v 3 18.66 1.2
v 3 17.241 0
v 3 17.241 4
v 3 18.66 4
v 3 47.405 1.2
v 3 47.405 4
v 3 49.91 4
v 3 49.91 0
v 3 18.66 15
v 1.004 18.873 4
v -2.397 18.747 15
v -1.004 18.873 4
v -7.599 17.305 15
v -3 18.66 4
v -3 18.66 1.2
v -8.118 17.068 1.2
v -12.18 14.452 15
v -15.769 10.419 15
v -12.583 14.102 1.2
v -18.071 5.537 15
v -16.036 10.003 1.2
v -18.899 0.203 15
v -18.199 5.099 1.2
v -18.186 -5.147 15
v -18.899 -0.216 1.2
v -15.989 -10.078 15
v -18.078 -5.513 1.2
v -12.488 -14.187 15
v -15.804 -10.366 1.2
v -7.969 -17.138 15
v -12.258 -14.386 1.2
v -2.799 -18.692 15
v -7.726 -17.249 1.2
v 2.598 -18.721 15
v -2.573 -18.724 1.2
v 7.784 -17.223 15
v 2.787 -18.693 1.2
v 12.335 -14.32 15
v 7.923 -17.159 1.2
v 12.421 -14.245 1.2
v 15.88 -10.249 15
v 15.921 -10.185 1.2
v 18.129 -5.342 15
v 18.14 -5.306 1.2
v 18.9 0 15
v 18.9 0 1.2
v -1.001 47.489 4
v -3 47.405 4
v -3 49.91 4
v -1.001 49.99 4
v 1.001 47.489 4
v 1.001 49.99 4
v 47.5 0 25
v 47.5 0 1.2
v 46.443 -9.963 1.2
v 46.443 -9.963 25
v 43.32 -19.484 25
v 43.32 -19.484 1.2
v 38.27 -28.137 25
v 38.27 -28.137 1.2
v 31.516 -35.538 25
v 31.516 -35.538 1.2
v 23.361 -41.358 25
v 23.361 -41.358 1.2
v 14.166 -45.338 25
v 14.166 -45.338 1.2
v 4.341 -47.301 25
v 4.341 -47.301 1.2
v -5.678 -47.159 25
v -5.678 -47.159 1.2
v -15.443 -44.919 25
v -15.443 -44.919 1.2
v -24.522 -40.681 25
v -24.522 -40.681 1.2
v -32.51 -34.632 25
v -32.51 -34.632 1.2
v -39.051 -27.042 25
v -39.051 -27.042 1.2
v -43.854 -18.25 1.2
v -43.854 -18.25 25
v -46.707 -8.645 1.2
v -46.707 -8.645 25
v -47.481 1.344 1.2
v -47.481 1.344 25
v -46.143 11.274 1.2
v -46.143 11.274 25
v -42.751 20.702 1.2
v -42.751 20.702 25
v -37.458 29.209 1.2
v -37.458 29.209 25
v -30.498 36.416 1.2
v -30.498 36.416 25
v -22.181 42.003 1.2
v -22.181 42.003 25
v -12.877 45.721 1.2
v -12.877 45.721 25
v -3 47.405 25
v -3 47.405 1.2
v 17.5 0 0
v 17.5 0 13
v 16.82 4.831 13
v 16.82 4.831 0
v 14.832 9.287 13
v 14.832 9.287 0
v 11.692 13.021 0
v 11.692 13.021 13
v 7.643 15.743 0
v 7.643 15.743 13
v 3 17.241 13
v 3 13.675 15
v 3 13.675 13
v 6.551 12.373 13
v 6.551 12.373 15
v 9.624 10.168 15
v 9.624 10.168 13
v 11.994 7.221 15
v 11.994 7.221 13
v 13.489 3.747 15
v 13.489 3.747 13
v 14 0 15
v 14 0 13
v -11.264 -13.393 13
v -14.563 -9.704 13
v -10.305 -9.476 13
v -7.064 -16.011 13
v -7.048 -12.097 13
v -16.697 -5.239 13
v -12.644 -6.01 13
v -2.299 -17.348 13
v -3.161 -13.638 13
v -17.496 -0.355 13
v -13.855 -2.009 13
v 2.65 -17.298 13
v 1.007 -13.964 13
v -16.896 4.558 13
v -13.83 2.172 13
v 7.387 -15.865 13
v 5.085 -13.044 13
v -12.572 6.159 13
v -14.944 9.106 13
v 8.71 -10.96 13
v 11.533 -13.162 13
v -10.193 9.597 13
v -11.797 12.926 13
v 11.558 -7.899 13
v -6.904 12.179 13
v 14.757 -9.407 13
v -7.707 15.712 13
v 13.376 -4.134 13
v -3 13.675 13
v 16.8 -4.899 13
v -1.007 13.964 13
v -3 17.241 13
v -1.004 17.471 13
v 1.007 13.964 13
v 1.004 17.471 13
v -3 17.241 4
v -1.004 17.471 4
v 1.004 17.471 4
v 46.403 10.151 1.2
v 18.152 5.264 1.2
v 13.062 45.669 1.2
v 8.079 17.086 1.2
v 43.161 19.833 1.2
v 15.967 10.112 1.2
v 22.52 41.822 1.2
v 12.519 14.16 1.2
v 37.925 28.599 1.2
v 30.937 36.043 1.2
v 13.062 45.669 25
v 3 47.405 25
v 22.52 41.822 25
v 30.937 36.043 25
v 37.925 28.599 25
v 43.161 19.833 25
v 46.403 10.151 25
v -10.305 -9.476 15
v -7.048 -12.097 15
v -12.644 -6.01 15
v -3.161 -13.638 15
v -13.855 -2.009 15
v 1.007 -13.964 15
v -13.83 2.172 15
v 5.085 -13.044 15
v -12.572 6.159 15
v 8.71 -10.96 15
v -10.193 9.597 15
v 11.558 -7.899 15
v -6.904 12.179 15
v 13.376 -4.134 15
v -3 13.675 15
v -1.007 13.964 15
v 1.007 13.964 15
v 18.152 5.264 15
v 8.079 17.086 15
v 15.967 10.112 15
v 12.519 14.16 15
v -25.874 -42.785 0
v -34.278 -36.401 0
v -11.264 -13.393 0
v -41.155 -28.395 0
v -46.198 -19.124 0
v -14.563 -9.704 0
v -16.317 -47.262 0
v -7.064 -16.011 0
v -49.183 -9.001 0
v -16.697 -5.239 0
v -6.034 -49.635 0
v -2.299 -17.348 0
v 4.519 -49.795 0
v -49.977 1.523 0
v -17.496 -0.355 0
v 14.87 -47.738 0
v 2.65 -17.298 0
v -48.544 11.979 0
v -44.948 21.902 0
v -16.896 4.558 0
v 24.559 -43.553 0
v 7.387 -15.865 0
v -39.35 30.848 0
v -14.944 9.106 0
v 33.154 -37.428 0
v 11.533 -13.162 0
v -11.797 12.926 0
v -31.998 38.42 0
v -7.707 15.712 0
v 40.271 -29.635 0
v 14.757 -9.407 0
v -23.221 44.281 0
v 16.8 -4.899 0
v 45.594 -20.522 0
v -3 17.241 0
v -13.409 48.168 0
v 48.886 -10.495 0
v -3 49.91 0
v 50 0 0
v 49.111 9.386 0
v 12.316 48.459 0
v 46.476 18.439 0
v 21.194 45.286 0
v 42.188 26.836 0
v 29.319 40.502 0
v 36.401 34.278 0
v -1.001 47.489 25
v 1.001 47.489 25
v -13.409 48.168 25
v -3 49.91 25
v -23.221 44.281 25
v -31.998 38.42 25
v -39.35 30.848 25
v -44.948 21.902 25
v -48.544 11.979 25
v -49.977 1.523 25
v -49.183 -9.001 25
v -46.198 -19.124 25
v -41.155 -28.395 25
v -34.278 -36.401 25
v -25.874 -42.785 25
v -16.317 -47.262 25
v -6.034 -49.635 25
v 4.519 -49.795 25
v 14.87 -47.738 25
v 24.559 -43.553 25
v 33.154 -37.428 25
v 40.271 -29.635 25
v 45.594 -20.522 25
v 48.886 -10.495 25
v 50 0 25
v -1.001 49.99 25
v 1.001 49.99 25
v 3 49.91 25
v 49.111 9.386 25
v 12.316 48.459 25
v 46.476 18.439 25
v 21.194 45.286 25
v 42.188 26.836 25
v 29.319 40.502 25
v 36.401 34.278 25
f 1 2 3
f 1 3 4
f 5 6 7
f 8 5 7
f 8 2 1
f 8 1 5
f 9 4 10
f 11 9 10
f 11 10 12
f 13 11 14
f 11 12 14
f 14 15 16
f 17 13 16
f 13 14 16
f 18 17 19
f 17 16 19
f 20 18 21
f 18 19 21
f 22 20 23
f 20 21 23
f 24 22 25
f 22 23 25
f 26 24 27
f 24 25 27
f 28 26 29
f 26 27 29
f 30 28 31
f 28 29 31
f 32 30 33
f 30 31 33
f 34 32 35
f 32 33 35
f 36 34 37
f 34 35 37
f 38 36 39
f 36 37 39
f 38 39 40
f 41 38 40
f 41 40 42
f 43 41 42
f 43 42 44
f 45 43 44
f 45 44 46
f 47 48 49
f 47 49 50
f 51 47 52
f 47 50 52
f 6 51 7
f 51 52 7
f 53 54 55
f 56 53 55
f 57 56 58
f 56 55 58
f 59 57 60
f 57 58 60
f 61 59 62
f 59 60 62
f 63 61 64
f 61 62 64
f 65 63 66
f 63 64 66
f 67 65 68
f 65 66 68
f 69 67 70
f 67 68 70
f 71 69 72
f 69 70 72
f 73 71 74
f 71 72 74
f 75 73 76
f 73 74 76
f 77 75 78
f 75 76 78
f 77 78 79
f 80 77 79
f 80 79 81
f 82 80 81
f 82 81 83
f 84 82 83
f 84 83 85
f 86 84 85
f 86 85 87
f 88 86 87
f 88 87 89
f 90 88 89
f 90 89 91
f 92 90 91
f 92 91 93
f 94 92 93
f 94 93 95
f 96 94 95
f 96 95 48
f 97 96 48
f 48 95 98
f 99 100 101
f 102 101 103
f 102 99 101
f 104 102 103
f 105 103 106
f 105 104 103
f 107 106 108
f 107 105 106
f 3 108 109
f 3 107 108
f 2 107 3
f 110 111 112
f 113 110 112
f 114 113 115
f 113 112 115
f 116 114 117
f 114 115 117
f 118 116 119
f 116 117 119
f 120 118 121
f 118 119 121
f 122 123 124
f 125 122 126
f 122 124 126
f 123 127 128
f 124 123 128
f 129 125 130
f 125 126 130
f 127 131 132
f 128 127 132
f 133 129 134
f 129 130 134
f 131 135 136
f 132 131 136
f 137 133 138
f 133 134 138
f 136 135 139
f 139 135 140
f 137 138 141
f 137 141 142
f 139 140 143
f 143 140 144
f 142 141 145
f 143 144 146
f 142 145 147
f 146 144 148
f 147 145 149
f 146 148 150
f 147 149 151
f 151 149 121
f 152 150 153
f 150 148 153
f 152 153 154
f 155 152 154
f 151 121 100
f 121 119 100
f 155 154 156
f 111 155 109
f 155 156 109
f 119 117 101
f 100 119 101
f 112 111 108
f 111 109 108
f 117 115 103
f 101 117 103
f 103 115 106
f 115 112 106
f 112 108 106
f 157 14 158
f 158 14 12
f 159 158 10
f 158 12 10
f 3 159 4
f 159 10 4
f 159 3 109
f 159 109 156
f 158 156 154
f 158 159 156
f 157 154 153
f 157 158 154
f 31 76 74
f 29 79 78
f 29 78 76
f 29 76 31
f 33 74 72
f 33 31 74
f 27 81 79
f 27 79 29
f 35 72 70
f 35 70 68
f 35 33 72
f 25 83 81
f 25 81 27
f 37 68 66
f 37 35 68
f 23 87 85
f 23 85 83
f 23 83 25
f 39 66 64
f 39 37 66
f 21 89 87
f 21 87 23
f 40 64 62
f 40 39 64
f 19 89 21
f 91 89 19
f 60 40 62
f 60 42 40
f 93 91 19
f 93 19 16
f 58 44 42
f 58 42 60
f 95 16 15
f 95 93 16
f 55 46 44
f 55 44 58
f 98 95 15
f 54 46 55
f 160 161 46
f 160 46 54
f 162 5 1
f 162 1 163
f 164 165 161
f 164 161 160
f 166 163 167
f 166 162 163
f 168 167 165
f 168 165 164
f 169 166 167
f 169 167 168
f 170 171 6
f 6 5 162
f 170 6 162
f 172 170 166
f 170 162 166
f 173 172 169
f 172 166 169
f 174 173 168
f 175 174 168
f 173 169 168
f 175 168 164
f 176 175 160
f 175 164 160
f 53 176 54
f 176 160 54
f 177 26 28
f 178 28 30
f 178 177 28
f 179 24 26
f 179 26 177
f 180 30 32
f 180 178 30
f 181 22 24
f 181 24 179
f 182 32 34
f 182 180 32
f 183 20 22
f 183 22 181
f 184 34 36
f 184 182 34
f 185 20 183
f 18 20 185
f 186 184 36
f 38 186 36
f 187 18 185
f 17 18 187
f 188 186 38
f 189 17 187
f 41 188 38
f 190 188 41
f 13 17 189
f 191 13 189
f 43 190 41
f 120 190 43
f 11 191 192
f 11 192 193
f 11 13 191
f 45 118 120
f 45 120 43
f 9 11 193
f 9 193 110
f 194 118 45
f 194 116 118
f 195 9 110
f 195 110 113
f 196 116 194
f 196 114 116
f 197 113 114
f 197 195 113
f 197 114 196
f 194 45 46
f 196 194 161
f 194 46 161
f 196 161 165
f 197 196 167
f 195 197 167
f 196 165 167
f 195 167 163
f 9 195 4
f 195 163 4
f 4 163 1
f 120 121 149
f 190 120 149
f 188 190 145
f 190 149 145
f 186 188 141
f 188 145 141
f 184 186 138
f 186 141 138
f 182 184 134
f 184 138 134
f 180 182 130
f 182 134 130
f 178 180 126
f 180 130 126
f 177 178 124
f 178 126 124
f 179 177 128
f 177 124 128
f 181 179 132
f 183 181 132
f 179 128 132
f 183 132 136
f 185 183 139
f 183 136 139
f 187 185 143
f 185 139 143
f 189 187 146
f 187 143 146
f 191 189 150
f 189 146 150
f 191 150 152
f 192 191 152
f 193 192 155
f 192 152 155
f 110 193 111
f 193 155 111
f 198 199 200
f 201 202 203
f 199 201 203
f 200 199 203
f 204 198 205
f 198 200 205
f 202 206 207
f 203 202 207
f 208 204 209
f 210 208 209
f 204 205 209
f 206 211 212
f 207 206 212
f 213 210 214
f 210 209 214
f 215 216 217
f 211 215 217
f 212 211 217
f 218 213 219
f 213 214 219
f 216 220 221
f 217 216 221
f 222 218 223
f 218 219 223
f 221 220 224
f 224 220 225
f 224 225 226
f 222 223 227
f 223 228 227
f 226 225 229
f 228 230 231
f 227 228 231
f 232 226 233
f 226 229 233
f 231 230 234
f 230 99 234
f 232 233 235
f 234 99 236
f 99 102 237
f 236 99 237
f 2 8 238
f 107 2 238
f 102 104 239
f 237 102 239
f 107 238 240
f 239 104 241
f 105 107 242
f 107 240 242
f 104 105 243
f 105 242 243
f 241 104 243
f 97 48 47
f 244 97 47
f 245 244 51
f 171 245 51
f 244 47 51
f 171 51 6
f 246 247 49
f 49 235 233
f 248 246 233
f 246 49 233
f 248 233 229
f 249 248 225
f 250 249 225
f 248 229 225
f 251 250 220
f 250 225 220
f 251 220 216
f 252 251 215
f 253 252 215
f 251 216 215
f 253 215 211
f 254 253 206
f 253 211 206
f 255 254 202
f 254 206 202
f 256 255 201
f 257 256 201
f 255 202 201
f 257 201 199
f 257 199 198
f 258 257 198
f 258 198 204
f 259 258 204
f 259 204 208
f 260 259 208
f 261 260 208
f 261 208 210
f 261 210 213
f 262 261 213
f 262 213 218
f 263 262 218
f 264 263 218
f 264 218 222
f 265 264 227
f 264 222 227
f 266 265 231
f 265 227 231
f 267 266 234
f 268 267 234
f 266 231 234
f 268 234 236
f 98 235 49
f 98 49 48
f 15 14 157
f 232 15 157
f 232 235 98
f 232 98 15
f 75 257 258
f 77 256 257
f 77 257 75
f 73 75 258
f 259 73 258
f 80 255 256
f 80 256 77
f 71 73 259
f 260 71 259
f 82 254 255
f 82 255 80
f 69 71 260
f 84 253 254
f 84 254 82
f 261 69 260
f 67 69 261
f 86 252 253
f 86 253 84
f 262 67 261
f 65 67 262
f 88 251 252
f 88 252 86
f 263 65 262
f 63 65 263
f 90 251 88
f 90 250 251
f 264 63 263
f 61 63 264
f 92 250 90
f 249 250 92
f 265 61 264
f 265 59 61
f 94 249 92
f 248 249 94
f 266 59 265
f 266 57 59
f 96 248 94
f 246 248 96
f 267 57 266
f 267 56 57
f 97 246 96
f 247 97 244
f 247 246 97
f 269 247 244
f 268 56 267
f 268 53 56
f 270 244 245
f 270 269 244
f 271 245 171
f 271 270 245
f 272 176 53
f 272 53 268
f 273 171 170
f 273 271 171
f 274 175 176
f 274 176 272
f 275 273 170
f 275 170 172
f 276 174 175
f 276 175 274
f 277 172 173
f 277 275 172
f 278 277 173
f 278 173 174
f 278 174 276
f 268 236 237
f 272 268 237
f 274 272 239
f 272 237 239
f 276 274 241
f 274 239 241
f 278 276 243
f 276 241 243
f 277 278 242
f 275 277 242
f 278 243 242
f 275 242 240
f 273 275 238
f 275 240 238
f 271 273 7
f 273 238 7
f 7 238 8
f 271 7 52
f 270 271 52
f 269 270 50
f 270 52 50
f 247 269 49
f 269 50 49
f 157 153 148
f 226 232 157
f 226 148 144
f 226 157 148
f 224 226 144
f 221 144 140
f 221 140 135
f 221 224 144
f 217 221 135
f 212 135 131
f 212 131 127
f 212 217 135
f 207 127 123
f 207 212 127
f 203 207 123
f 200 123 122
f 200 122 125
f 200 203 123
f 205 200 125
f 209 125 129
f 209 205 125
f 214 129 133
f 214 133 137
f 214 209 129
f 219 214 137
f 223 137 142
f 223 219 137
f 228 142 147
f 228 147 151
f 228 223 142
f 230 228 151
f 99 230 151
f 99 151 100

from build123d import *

# Parameters (mm, degrees)
F1_DEPTH = 15
F2_DEPTH = 13
F3_DEPTH = 1.2
F4_DEPTH = 25
F5_DEPTH = 4


with BuildPart() as f1:
    # F0 (on Top) → F1 (new body)
    with BuildSketch(Plane.XY):
        with BuildLine():
            ThreePointArc((-3, 17.2409396496), (0, 17.5), (3, 17.2409396496))
            Line((3, 17.2409396496), (3, 18.6603858481))
            ThreePointArc((3, 18.6603858481), (0, 18.9), (-3, 18.6603858481))
            Line((-3, 18.6603858481), (-3, 17.2409396496))
        make_face()
        with BuildLine():
            Line((3, 18.6603858481), (3, 17.2409396496))
            ThreePointArc((3, 17.2409396496), (13.393095236, 11.2638803261), (17.5, 0))
            ThreePointArc((17.5, 0), (-11.2638803261, -13.393095236), (-3, 17.2409396496))
            Line((-3, 17.2409396496), (-3, 18.6603858481))
            ThreePointArc((-3, 18.6603858481), (-12.2578546247, -14.3859306268), (18.9, 0))
            ThreePointArc((18.9, 0), (14.3859306268, 12.2578546247), (3, 18.6603858481))
        make_face()
        with BuildLine():
            ThreePointArc((-3, 13.6747943312), (0, 14), (3, 13.6747943312))
            Line((3, 13.6747943312), (3, 17.2409396496))
            ThreePointArc((3, 17.2409396496), (0, 17.5), (-3, 17.2409396496))
            Line((-3, 17.2409396496), (-3, 13.6747943312))
        make_face()
        with BuildLine():
            ThreePointArc((3, 13.6747943312), (10.9087121146, 8.7749643874), (14, 0))
            ThreePointArc((14, 0), (-8.7749643874, -10.9087121146), (-3, 13.6747943312))
            Line((-3, 13.6747943312), (-3, 17.2409396496))
            ThreePointArc((-3, 17.2409396496), (-11.2638803261, -13.393095236), (17.5, 0))
            ThreePointArc((17.5, 0), (13.393095236, 11.2638803261), (3, 17.2409396496))
            Line((3, 17.2409396496), (3, 13.6747943312))
        make_face()
    extrude(amount=F1_DEPTH)

    # F0 (on Top) → F2 (cut)
    with BuildSketch(Plane.XY):
        with BuildLine():
            ThreePointArc((-3, 13.6747943312), (0, 14), (3, 13.6747943312))
            Line((3, 13.6747943312), (3, 17.2409396496))
            ThreePointArc((3, 17.2409396496), (0, 17.5), (-3, 17.2409396496))
            Line((-3, 17.2409396496), (-3, 13.6747943312))
        make_face()
        with BuildLine():
            ThreePointArc((3, 13.6747943312), (10.9087121146, 8.7749643874), (14, 0))
            ThreePointArc((14, 0), (-8.7749643874, -10.9087121146), (-3, 13.6747943312))
            Line((-3, 13.6747943312), (-3, 17.2409396496))
            ThreePointArc((-3, 17.2409396496), (-11.2638803261, -13.393095236), (17.5, 0))
            ThreePointArc((17.5, 0), (13.393095236, 11.2638803261), (3, 17.2409396496))
            Line((3, 17.2409396496), (3, 13.6747943312))
        make_face()
    extrude(amount=F2_DEPTH, mode=Mode.SUBTRACT)

    # F0 (on Top) → F3 (join)
    with BuildSketch(Plane.XY):
        with BuildLine():
            ThreePointArc((-3, 18.6603858481), (0, 18.9), (3, 18.6603858481))
            Line((3, 18.6603858481), (3, 47.4051684946))
            ThreePointArc((3, 47.4051684946), (0, 47.5), (-3, 47.4051684946))
            Line((-3, 47.4051684946), (-3, 18.6603858481))
        make_face()
        with BuildLine():
            Line((3, 47.4051684946), (3, 18.6603858481))
            ThreePointArc((3, 18.6603858481), (14.3859306268, 12.2578546247), (18.9, 0))
            ThreePointArc((18.9, 0), (-12.2578546247, -14.3859306268), (-3, 18.6603858481))
            Line((-3, 18.6603858481), (-3, 47.4051684946))
            ThreePointArc((-3, 47.4051684946), (-32.5096139626, -34.6319938785), (47.5, 0))
            ThreePointArc((47.5, 0), (34.6319938785, 32.5096139626), (3, 47.4051684946))
        make_face()
    extrude(amount=F3_DEPTH)

    # F0 (on Top) → F4 (join)
    with BuildSketch(Plane.XY):
        with BuildLine():
            ThreePointArc((-3, 47.4051684946), (0, 47.5), (3, 47.4051684946))
            Line((3, 47.4051684946), (3, 49.9099188539))
            ThreePointArc((3, 49.9099188539), (0, 50), (-3, 49.9099188539))
            Line((-3, 49.9099188539), (-3, 47.4051684946))
        make_face()
        with BuildLine():
            Line((3, 49.9099188539), (3, 47.4051684946))
            ThreePointArc((3, 47.4051684946), (34.6319938785, 32.5096139626), (47.5, 0))
            ThreePointArc((47.5, 0), (-32.5096139626, -34.6319938785), (-3, 47.4051684946))
            Line((-3, 47.4051684946), (-3, 49.9099188539))
            ThreePointArc((-3, 49.9099188539), (-34.278273002, -36.4005494464), (50, 0))
            ThreePointArc((50, 0), (36.4005494464, 34.278273002), (3, 49.9099188539))
        make_face()
    extrude(amount=F4_DEPTH)

    # F0 (on Top) → F5 (cut)
    with BuildSketch(Plane.XY):
        with BuildLine():
            ThreePointArc((-3, 17.2409396496), (0, 17.5), (3, 17.2409396496))
            Line((3, 17.2409396496), (3, 18.6603858481))
            ThreePointArc((3, 18.6603858481), (0, 18.9), (-3, 18.6603858481))
            Line((-3, 18.6603858481), (-3, 17.2409396496))
        make_face()
        with BuildLine():
            ThreePointArc((-3, 18.6603858481), (0, 18.9), (3, 18.6603858481))
            Line((3, 18.6603858481), (3, 47.4051684946))
            ThreePointArc((3, 47.4051684946), (0, 47.5), (-3, 47.4051684946))
            Line((-3, 47.4051684946), (-3, 18.6603858481))
        make_face()
        with BuildLine():
            ThreePointArc((-3, 47.4051684946), (0, 47.5), (3, 47.4051684946))
            Line((3, 47.4051684946), (3, 49.9099188539))
            ThreePointArc((3, 49.9099188539), (0, 50), (-3, 49.9099188539))
            Line((-3, 49.9099188539), (-3, 47.4051684946))
        make_face()
    extrude(amount=F5_DEPTH, mode=Mode.SUBTRACT)


solid = f1.part
